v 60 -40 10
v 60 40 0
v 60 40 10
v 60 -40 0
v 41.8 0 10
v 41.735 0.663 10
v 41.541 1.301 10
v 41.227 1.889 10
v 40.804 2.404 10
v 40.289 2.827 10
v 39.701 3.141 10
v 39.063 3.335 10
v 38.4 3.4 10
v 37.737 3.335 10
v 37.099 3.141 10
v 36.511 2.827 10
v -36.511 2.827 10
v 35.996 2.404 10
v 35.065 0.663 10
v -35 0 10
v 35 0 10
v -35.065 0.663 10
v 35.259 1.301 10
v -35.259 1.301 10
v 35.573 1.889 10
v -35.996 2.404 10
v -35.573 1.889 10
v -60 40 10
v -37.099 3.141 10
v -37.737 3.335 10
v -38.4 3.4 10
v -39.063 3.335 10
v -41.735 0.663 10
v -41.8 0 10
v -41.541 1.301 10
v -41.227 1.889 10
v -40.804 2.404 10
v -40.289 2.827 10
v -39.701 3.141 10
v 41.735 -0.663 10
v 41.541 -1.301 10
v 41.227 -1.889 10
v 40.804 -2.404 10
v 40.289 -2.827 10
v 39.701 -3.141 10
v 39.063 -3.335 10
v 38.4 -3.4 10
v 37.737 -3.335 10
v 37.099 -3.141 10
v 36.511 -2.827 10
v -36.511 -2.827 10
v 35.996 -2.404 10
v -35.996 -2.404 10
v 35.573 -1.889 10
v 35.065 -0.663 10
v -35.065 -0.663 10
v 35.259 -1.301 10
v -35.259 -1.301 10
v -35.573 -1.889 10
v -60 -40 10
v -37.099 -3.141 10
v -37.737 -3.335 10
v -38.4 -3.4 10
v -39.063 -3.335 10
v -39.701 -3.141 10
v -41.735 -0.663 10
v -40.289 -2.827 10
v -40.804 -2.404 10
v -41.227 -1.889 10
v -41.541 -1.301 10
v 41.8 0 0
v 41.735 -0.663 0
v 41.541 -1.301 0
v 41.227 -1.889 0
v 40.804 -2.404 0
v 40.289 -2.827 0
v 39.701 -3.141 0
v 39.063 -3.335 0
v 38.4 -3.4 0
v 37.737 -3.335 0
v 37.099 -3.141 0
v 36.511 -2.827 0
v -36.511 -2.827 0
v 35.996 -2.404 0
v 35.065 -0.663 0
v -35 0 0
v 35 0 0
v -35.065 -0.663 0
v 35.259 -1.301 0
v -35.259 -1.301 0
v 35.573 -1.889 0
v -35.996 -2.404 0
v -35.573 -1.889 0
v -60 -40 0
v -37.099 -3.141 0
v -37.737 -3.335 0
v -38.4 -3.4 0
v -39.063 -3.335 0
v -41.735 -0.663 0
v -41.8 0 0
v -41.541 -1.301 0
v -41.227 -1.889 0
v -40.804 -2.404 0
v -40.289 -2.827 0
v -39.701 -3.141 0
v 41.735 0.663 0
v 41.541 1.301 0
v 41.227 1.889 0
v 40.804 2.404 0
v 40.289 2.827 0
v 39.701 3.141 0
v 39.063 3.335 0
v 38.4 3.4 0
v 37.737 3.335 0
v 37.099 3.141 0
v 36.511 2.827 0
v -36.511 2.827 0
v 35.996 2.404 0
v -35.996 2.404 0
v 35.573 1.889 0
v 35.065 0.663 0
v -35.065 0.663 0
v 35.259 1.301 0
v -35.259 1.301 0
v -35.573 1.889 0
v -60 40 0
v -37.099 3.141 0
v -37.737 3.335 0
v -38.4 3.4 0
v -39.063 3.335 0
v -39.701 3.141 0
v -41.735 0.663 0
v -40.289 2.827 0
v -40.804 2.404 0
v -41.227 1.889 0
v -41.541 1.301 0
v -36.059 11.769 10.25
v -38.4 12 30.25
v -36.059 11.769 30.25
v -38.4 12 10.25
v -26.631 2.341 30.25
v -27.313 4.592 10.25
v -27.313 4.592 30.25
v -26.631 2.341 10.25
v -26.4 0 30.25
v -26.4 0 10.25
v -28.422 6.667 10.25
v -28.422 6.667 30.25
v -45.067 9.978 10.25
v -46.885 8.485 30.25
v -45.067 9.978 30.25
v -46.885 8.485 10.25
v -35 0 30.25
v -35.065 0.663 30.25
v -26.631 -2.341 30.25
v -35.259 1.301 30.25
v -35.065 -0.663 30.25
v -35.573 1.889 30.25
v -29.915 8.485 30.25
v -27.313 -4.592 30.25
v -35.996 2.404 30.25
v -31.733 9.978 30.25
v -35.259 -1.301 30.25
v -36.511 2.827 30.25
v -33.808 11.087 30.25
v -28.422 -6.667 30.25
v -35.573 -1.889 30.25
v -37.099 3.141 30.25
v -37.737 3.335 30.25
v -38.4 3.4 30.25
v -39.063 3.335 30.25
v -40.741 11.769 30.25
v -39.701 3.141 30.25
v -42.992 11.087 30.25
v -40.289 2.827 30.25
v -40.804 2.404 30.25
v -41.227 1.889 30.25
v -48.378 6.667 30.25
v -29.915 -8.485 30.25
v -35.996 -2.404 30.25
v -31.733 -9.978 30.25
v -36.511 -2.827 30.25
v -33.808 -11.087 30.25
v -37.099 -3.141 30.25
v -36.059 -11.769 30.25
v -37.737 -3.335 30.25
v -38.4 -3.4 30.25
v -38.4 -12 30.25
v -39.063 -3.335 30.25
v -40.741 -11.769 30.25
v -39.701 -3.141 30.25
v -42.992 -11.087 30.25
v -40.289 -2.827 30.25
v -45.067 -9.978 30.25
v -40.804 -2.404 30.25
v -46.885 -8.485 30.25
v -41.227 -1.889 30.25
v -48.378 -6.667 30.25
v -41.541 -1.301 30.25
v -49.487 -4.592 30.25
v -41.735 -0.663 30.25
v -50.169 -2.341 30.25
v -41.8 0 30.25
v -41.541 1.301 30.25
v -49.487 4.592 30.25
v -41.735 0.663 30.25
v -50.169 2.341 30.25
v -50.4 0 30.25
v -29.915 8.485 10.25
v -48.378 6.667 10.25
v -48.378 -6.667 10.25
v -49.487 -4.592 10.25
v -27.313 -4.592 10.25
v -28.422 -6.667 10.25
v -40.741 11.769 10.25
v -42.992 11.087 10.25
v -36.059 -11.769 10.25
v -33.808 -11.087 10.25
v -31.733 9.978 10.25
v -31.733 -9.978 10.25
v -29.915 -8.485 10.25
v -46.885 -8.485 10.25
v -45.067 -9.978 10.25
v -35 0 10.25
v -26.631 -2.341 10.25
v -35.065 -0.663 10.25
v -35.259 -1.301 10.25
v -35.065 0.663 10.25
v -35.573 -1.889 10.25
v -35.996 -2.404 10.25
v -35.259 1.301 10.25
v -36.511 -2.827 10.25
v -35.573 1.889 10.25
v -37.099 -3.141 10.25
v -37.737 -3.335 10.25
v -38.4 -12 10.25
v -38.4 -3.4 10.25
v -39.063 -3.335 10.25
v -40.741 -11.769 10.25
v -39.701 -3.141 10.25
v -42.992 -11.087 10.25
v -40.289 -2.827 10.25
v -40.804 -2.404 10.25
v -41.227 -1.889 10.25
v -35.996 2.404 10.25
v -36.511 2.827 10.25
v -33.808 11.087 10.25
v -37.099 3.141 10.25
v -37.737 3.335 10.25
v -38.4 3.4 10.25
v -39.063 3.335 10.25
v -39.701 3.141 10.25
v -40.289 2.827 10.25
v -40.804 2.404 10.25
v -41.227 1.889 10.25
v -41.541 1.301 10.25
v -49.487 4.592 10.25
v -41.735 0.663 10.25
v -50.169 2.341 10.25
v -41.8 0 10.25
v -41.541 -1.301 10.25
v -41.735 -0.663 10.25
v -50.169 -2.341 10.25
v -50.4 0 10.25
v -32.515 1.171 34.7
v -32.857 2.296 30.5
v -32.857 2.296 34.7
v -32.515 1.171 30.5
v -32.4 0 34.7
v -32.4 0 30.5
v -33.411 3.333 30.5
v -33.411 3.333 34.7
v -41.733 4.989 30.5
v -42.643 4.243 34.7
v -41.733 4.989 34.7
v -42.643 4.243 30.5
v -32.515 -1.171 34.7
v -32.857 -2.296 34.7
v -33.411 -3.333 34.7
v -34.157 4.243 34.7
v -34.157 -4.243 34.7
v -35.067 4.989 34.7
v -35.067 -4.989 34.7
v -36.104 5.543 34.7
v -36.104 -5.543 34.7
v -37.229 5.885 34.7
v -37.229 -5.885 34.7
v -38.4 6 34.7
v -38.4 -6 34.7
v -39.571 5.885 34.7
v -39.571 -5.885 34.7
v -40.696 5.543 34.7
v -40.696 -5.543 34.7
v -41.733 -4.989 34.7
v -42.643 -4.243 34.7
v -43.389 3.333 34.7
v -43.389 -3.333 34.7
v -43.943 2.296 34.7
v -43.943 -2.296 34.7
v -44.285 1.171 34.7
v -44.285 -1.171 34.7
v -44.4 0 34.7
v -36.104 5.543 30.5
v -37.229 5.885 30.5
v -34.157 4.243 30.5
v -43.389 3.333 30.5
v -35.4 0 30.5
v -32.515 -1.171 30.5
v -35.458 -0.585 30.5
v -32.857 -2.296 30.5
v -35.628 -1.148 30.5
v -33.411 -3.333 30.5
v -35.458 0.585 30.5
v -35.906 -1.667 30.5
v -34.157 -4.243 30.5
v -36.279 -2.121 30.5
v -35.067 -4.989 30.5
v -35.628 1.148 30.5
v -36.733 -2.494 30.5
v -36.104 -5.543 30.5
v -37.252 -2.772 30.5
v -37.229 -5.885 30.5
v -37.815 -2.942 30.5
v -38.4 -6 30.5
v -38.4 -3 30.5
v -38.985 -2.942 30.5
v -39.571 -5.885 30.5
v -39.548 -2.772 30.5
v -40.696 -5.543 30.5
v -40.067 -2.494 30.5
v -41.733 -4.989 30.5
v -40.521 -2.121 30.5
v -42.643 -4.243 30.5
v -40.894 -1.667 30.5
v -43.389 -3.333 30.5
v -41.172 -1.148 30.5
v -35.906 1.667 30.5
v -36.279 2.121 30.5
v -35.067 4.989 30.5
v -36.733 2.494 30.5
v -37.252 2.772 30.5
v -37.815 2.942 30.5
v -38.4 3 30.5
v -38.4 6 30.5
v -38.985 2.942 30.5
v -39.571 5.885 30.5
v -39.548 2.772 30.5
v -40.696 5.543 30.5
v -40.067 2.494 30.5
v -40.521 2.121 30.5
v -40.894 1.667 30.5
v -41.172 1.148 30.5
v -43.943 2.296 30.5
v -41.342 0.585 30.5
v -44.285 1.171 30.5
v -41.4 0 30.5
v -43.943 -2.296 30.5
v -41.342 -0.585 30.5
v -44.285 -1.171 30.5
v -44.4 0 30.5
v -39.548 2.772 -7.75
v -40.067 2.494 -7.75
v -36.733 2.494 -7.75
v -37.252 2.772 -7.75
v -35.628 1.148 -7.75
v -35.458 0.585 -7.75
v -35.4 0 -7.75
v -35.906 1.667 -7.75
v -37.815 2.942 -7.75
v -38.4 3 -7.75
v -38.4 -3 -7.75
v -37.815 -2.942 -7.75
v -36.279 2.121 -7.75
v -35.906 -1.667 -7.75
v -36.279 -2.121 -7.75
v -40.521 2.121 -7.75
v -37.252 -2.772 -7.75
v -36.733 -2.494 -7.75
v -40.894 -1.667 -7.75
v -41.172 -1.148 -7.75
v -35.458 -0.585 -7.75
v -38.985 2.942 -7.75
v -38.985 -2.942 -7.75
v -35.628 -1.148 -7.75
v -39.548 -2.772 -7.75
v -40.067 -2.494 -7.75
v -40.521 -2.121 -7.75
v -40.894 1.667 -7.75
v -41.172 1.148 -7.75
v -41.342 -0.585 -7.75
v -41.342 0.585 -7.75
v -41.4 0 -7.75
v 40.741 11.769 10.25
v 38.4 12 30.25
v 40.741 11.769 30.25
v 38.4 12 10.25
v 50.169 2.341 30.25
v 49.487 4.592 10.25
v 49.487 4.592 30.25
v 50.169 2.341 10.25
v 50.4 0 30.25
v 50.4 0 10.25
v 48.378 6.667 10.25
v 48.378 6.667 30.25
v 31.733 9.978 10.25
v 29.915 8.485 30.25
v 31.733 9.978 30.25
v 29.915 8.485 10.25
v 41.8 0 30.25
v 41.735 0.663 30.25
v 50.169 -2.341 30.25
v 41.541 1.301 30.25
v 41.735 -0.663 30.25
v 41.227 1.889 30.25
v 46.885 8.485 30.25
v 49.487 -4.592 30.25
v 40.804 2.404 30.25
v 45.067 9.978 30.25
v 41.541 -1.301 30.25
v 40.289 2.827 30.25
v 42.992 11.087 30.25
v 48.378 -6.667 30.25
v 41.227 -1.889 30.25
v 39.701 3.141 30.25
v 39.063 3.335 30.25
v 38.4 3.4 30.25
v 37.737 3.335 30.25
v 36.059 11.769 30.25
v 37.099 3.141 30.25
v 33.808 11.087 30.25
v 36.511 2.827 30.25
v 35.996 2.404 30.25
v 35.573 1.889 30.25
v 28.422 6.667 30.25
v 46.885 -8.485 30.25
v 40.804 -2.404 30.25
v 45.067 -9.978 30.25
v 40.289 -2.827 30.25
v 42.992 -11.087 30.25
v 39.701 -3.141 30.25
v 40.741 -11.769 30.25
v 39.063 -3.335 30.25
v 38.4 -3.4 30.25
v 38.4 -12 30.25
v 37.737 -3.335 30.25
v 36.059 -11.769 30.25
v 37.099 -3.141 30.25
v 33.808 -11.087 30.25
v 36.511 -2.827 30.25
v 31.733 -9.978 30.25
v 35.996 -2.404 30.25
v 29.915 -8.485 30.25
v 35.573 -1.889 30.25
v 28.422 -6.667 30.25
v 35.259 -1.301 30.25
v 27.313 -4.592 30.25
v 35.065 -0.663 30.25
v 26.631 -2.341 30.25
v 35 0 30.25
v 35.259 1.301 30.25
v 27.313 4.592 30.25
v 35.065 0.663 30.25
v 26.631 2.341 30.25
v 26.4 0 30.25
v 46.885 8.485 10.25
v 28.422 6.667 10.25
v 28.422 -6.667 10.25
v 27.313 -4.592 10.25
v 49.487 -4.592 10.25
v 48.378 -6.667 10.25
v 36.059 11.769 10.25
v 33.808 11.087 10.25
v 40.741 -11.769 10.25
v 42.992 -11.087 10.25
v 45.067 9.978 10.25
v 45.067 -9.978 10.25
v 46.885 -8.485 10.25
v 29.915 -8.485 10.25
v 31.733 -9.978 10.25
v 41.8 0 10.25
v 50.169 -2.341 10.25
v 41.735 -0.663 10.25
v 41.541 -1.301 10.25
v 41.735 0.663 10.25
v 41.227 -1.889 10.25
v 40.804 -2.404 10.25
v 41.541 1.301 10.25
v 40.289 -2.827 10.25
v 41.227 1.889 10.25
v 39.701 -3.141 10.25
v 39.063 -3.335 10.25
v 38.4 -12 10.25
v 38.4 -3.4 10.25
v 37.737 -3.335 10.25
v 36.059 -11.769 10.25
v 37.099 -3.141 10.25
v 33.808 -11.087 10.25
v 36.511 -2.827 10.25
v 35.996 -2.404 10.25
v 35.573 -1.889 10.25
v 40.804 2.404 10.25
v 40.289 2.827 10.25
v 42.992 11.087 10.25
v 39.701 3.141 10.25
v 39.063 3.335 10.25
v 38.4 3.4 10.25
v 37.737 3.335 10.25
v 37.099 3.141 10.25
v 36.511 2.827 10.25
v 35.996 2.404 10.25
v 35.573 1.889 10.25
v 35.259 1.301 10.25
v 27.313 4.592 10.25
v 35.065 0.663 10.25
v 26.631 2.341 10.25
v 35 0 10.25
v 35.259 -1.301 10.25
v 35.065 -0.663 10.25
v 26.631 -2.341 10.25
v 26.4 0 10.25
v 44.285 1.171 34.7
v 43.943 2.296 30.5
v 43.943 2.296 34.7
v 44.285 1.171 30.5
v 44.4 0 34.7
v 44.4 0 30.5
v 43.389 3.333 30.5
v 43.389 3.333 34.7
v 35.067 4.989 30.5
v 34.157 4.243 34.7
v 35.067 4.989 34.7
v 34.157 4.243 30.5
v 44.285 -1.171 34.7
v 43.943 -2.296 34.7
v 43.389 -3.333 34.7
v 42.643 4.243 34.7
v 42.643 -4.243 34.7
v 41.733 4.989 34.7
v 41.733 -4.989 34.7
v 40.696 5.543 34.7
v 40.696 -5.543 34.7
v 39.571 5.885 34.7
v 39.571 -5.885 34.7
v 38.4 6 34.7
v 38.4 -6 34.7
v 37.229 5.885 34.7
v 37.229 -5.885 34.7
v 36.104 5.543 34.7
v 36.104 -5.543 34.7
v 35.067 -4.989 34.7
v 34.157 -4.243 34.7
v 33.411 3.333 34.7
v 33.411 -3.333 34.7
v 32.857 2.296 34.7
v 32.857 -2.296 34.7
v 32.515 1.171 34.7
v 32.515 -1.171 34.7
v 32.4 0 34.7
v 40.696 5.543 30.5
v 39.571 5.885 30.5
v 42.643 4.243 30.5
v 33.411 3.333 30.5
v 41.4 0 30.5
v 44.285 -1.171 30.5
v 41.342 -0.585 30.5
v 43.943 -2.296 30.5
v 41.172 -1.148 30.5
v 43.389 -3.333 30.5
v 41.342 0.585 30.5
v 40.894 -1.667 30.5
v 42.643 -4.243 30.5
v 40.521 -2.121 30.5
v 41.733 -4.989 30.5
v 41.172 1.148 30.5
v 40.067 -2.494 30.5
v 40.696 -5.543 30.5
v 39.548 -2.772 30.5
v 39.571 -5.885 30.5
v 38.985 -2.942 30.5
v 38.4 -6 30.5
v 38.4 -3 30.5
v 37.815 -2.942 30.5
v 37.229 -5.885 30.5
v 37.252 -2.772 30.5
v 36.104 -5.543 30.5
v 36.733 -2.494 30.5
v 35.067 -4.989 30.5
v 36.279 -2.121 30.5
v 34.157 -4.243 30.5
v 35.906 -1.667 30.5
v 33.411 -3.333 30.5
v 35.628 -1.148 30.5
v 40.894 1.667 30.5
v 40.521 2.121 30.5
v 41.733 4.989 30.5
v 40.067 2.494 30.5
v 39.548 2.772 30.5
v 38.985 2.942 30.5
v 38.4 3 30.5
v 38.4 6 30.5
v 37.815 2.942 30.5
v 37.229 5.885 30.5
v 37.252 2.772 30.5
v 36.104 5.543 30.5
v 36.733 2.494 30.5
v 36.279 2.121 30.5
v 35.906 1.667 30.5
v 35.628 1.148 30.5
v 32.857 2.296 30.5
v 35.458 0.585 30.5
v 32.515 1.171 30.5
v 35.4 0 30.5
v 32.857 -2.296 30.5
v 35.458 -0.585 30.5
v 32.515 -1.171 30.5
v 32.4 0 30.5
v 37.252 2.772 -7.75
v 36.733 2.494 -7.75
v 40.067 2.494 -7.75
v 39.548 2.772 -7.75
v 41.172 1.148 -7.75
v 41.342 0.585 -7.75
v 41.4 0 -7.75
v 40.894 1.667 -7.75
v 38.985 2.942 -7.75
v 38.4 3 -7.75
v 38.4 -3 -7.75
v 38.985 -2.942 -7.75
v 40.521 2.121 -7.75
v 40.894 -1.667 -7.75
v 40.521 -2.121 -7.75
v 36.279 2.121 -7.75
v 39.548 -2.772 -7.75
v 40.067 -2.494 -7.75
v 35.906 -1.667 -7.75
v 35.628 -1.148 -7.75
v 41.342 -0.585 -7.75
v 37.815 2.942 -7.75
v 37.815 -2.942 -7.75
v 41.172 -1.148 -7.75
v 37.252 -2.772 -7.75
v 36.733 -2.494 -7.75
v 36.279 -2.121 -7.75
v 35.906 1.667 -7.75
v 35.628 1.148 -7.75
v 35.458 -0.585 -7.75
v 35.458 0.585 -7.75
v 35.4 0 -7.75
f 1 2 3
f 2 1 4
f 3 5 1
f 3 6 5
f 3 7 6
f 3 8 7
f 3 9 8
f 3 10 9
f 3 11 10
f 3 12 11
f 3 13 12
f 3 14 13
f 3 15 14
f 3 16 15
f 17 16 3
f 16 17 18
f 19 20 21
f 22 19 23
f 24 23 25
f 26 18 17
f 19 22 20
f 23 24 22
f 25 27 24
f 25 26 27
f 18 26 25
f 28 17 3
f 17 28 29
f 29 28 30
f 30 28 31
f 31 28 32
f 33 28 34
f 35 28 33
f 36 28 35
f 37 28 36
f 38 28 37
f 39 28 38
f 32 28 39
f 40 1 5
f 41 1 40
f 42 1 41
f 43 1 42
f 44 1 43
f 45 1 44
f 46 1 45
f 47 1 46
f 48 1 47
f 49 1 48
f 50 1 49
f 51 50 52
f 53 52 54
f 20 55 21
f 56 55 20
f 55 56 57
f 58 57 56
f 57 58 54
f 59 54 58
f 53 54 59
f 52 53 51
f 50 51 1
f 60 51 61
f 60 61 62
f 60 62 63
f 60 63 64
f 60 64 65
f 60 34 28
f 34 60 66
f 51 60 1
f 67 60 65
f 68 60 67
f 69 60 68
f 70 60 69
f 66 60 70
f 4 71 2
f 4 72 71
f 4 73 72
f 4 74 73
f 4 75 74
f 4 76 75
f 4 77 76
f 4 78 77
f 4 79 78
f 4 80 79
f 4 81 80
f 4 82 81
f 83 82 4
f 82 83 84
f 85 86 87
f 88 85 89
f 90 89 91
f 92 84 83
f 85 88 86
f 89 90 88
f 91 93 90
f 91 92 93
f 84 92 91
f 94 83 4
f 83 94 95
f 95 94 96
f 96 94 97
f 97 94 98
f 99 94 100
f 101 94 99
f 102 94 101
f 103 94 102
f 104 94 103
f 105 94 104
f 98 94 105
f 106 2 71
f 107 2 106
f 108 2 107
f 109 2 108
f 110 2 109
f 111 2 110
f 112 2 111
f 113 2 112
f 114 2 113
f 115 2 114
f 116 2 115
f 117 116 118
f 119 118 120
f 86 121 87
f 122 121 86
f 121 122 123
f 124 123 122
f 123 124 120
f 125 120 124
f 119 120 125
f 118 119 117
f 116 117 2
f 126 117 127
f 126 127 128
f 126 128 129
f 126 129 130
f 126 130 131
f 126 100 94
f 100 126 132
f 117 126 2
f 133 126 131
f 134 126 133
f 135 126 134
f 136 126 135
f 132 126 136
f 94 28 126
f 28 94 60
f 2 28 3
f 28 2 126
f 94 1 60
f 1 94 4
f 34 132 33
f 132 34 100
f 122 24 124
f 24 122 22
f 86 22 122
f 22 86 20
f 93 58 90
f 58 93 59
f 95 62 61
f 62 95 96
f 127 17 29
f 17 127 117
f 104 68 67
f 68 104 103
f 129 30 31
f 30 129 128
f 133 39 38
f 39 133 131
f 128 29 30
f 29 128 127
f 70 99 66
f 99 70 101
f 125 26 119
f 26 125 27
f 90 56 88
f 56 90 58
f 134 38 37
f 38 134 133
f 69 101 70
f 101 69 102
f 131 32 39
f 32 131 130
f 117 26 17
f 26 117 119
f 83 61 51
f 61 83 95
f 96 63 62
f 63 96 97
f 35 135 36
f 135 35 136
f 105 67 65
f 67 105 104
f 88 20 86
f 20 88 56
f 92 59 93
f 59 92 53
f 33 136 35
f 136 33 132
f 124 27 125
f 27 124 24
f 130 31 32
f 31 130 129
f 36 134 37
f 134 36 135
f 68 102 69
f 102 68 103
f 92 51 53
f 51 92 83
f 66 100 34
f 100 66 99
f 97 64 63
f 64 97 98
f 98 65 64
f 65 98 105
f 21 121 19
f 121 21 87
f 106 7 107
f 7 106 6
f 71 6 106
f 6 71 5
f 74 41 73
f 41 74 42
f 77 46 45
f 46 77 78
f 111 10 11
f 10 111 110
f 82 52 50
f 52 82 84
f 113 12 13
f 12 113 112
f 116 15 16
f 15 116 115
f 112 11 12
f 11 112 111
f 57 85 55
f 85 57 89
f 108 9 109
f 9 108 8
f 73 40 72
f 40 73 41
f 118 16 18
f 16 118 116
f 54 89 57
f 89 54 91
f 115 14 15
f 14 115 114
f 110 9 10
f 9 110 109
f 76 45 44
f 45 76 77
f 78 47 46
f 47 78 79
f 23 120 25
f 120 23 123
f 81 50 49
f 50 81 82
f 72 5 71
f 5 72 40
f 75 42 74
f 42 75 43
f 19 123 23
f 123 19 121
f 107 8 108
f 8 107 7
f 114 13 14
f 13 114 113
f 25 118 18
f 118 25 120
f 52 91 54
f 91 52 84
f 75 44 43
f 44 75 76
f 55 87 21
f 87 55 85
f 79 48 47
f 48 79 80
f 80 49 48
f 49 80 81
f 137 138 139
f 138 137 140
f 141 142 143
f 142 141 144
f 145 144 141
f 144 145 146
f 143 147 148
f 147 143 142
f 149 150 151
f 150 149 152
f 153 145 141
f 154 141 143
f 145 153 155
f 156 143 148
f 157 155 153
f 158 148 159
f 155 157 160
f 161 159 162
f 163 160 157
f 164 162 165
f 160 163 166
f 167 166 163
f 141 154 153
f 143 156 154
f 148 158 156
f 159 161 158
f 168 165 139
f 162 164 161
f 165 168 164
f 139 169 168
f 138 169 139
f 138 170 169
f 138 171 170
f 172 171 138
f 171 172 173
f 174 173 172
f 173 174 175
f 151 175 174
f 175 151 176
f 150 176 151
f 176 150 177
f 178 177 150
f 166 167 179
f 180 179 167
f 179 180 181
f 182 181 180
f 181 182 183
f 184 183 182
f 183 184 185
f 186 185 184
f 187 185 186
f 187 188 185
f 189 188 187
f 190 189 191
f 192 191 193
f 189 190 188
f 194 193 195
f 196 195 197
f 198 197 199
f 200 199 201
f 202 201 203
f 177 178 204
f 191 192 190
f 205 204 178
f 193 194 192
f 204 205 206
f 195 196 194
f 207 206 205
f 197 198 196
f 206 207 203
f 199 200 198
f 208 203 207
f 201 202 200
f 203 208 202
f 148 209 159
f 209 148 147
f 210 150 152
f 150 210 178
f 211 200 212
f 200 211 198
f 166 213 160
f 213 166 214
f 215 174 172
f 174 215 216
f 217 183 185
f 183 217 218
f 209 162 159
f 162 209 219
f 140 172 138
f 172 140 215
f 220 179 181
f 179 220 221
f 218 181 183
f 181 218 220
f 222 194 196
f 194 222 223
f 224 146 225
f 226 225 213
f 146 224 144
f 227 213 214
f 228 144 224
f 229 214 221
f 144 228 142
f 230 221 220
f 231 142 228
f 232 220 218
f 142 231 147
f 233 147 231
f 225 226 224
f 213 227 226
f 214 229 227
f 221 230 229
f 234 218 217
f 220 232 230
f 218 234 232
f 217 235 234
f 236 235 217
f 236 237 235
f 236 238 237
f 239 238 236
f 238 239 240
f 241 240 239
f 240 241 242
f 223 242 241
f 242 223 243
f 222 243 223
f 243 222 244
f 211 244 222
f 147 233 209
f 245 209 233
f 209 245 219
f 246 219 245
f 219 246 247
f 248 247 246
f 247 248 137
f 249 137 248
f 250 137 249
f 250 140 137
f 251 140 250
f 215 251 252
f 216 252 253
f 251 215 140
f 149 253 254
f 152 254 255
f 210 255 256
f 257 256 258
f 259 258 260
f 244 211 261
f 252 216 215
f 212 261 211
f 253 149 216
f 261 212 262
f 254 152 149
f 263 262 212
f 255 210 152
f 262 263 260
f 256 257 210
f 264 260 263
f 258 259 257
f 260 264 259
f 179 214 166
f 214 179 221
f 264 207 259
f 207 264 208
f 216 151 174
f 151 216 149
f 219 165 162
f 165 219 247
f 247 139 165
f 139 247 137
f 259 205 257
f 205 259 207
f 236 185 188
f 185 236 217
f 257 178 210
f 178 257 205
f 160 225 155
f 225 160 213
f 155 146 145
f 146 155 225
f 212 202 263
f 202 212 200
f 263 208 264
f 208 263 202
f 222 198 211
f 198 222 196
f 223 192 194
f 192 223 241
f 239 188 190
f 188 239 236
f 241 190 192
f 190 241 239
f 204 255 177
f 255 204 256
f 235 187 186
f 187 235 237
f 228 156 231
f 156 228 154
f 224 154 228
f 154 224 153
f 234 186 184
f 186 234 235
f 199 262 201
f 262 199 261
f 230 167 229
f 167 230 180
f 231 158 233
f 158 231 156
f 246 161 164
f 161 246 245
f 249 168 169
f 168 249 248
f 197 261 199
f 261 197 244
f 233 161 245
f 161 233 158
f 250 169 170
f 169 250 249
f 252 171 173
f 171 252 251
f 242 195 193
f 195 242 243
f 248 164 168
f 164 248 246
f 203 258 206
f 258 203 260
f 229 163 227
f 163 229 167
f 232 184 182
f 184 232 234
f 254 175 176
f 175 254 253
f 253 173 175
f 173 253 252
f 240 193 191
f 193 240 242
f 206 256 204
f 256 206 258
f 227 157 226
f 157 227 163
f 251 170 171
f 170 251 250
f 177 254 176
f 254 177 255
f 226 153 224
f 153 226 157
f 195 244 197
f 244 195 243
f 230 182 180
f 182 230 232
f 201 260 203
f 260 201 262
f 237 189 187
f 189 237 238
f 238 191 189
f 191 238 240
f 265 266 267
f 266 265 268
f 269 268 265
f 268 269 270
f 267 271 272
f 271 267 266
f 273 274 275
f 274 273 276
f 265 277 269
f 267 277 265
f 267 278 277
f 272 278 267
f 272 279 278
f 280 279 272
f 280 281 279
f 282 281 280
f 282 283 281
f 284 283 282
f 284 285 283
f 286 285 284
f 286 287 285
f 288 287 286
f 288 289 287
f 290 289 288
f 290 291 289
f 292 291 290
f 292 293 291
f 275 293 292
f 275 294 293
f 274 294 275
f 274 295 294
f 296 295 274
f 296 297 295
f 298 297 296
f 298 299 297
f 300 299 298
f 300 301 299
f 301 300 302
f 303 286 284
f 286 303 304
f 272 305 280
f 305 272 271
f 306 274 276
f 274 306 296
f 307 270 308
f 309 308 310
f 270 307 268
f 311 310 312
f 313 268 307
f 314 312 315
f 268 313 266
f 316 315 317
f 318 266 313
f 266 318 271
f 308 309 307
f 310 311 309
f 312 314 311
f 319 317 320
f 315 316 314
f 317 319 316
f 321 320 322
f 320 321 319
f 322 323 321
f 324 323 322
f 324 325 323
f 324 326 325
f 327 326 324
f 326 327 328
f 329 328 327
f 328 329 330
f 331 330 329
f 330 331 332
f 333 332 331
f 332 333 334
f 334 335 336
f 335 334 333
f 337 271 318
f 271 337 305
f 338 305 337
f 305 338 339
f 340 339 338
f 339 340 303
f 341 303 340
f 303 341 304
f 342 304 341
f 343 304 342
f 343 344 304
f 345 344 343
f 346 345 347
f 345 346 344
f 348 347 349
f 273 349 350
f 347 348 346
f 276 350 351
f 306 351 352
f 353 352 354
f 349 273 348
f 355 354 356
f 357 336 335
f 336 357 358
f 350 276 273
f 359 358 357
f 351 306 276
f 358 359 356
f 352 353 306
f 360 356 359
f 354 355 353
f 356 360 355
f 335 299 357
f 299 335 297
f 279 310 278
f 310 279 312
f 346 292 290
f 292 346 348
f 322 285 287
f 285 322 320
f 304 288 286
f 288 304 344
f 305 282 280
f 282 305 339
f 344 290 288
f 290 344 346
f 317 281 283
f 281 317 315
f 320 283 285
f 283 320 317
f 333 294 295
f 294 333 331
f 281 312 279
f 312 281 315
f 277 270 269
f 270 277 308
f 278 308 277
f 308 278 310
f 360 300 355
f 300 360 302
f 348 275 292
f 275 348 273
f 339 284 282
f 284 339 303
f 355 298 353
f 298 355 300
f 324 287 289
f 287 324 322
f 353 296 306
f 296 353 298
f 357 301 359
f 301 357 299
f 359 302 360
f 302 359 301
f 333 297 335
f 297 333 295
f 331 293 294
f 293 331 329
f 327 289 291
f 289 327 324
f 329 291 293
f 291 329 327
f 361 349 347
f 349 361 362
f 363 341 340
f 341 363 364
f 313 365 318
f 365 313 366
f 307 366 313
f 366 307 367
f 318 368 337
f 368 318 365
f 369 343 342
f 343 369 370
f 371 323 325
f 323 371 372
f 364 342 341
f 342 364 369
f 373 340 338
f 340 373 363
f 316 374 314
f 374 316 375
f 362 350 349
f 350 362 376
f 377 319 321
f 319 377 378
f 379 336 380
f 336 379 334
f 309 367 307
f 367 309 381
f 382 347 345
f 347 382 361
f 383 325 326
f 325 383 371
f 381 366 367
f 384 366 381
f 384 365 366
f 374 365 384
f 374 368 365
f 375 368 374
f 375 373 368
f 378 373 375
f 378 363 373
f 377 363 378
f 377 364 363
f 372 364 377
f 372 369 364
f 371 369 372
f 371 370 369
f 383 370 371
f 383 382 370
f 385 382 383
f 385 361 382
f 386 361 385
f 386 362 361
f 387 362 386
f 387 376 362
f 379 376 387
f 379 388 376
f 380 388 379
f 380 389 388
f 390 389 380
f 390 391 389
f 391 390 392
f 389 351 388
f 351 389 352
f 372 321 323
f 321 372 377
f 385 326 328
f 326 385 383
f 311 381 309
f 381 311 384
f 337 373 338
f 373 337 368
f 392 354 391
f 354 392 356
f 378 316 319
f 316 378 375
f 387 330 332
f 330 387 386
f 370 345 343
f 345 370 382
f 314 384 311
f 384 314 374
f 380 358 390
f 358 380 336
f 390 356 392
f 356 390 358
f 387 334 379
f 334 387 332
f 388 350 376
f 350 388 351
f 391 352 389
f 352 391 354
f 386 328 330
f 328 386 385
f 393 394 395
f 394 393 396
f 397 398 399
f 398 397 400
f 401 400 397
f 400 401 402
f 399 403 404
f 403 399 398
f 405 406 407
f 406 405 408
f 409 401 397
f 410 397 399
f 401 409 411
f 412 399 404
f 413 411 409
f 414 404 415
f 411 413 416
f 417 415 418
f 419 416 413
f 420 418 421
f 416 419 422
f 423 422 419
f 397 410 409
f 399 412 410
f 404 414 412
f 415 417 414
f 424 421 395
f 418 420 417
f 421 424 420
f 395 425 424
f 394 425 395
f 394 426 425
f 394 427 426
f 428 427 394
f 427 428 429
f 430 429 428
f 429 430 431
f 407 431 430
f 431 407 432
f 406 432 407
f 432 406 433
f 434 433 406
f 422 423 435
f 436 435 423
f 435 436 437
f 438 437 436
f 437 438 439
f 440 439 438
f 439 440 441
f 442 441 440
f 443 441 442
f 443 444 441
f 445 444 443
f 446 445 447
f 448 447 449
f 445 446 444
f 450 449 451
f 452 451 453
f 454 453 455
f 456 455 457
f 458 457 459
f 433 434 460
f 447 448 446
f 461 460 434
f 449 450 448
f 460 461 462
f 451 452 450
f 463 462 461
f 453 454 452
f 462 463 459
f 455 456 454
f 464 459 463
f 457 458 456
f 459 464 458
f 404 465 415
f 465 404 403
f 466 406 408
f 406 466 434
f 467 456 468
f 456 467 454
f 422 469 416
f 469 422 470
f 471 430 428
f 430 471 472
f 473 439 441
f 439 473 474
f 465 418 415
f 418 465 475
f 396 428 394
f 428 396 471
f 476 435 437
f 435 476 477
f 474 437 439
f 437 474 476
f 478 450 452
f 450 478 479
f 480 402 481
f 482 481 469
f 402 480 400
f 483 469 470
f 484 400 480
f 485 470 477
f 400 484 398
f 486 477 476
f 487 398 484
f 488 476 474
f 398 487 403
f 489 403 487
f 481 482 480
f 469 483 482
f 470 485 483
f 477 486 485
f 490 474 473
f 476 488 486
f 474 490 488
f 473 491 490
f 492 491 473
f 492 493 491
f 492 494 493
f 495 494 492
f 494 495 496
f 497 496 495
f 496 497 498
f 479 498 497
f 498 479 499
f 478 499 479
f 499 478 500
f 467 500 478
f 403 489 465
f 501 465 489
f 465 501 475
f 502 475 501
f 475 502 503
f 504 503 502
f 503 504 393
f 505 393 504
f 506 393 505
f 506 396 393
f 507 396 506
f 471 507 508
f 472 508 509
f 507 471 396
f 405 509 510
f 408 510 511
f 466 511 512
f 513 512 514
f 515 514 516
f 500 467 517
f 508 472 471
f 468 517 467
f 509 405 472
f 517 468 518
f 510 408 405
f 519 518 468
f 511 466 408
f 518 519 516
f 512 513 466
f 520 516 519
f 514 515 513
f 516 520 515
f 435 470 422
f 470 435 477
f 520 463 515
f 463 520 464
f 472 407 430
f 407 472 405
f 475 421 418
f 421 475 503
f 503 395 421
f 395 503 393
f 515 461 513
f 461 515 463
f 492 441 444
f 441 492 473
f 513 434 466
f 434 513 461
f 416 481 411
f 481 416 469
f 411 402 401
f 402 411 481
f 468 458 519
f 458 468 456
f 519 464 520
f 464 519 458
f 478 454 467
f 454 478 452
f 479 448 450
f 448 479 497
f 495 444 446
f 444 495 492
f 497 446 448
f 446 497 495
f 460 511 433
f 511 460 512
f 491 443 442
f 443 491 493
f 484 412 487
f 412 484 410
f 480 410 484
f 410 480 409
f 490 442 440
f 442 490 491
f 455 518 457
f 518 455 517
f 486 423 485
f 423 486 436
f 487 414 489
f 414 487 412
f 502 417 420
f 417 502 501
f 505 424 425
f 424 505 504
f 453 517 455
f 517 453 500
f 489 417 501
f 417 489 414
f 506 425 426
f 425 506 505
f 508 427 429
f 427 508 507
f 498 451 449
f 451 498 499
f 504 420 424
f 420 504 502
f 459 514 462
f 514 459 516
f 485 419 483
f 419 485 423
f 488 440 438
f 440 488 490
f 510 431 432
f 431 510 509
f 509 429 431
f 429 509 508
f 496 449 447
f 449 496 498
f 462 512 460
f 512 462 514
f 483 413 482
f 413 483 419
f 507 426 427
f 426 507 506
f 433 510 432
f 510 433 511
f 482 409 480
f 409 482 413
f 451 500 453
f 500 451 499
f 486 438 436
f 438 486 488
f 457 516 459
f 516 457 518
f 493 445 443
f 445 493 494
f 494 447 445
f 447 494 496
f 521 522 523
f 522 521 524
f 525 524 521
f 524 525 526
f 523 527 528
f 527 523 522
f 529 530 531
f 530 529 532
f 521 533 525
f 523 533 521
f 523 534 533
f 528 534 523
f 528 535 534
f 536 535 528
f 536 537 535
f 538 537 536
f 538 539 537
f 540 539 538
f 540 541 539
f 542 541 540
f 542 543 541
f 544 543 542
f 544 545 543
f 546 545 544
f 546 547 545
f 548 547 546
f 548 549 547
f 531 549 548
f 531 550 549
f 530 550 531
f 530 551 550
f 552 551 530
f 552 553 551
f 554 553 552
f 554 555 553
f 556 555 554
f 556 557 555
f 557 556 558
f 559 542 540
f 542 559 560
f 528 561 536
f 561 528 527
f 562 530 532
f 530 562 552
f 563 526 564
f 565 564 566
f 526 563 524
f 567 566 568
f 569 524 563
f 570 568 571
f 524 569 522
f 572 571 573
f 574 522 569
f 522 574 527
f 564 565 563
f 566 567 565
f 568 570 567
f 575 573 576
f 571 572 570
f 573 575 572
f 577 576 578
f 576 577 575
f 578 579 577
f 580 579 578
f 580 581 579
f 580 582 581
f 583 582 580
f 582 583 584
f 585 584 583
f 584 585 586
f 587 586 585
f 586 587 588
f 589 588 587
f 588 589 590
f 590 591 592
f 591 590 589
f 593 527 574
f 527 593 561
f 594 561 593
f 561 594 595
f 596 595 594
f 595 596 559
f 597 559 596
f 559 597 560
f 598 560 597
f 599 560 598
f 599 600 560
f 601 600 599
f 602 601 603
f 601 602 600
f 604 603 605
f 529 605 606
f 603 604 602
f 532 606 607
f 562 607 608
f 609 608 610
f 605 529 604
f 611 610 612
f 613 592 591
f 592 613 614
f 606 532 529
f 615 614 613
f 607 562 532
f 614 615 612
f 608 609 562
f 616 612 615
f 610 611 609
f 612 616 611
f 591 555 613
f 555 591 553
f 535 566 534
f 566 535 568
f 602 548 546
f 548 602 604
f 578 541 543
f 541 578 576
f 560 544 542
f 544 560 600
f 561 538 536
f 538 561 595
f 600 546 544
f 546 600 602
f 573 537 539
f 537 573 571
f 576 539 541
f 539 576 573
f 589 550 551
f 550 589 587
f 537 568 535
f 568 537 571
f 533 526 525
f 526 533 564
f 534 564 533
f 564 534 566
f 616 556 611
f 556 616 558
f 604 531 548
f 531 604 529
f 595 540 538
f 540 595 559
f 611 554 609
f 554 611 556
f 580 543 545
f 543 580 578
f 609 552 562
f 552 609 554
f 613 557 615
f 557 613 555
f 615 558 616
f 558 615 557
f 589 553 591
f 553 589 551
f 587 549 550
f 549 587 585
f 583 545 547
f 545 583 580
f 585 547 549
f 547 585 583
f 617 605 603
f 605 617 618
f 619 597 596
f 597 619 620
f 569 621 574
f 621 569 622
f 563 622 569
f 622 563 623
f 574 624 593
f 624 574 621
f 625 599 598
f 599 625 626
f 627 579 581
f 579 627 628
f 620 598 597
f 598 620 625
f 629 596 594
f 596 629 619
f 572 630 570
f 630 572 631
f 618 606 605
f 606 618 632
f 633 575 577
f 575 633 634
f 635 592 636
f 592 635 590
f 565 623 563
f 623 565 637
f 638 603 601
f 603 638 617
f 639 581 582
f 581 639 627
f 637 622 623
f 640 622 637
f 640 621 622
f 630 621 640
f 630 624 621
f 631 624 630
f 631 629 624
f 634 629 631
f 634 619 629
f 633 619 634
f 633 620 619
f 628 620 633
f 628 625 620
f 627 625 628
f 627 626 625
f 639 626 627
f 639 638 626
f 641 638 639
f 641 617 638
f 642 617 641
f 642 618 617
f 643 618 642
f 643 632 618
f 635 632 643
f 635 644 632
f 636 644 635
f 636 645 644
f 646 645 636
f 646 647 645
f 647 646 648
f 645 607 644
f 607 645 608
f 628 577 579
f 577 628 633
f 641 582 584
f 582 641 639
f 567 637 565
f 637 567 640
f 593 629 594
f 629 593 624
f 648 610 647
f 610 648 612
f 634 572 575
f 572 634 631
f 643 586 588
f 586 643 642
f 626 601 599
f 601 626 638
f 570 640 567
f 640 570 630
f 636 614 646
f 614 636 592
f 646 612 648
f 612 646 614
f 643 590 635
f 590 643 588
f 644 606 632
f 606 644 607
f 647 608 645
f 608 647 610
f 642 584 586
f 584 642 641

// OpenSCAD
$fn = 32;

// ------------------------------------------------------------------------
// Standoff columns: 2 d24 standoffs, bolts d6
// Every part is its own module, assembly() places them once.
// ------------------------------------------------------------------------

// --- part 1 ---
module base_plate() {
  difference() {
    translate([-60, -40, 0]) cube([120, 80, 10]);
    translate([-38.4, 0, -1]) cylinder(h = 12, d = 6.8);
    translate([38.4, 0, -1]) cylinder(h = 12, d = 6.8);
  }
}

// --- part 2 ---
module spacer1() {
  difference() {
      translate([0, 0, 0]) cylinder(h = 20, d = 24);
      translate([0, 0, -1]) cylinder(h = 22, d = 6.8);
    }
}

// --- part 3 ---
module bolt1() {
  cylinder(h = 4.2, d = 12);
  translate([0, 0, -38.25]) cylinder(h = 38.25, d = 6);
}

// --- part 4 ---
module spacer2() {
  difference() {
      translate([0, 0, 0]) cylinder(h = 20, d = 24);
      translate([0, 0, -1]) cylinder(h = 22, d = 6.8);
    }
}

// --- part 5 ---
module bolt2() {
  cylinder(h = 4.2, d = 12);
  translate([0, 0, -38.25]) cylinder(h = 38.25, d = 6);
}

// --- assembly ---
module assembly() {
  translate([0, 0, 0]) rotate([0, 0, 0]) base_plate();
  translate([-38.4, 0, 10.25]) rotate([0, 0, 0]) spacer1();
  translate([-38.4, 0, 30.5]) rotate([0, 0, 0]) bolt1();
  translate([38.4, 0, 10.25]) rotate([0, 0, 0]) spacer2();
  translate([38.4, 0, 30.5]) rotate([0, 0, 0]) bolt2();
}

assembly();
